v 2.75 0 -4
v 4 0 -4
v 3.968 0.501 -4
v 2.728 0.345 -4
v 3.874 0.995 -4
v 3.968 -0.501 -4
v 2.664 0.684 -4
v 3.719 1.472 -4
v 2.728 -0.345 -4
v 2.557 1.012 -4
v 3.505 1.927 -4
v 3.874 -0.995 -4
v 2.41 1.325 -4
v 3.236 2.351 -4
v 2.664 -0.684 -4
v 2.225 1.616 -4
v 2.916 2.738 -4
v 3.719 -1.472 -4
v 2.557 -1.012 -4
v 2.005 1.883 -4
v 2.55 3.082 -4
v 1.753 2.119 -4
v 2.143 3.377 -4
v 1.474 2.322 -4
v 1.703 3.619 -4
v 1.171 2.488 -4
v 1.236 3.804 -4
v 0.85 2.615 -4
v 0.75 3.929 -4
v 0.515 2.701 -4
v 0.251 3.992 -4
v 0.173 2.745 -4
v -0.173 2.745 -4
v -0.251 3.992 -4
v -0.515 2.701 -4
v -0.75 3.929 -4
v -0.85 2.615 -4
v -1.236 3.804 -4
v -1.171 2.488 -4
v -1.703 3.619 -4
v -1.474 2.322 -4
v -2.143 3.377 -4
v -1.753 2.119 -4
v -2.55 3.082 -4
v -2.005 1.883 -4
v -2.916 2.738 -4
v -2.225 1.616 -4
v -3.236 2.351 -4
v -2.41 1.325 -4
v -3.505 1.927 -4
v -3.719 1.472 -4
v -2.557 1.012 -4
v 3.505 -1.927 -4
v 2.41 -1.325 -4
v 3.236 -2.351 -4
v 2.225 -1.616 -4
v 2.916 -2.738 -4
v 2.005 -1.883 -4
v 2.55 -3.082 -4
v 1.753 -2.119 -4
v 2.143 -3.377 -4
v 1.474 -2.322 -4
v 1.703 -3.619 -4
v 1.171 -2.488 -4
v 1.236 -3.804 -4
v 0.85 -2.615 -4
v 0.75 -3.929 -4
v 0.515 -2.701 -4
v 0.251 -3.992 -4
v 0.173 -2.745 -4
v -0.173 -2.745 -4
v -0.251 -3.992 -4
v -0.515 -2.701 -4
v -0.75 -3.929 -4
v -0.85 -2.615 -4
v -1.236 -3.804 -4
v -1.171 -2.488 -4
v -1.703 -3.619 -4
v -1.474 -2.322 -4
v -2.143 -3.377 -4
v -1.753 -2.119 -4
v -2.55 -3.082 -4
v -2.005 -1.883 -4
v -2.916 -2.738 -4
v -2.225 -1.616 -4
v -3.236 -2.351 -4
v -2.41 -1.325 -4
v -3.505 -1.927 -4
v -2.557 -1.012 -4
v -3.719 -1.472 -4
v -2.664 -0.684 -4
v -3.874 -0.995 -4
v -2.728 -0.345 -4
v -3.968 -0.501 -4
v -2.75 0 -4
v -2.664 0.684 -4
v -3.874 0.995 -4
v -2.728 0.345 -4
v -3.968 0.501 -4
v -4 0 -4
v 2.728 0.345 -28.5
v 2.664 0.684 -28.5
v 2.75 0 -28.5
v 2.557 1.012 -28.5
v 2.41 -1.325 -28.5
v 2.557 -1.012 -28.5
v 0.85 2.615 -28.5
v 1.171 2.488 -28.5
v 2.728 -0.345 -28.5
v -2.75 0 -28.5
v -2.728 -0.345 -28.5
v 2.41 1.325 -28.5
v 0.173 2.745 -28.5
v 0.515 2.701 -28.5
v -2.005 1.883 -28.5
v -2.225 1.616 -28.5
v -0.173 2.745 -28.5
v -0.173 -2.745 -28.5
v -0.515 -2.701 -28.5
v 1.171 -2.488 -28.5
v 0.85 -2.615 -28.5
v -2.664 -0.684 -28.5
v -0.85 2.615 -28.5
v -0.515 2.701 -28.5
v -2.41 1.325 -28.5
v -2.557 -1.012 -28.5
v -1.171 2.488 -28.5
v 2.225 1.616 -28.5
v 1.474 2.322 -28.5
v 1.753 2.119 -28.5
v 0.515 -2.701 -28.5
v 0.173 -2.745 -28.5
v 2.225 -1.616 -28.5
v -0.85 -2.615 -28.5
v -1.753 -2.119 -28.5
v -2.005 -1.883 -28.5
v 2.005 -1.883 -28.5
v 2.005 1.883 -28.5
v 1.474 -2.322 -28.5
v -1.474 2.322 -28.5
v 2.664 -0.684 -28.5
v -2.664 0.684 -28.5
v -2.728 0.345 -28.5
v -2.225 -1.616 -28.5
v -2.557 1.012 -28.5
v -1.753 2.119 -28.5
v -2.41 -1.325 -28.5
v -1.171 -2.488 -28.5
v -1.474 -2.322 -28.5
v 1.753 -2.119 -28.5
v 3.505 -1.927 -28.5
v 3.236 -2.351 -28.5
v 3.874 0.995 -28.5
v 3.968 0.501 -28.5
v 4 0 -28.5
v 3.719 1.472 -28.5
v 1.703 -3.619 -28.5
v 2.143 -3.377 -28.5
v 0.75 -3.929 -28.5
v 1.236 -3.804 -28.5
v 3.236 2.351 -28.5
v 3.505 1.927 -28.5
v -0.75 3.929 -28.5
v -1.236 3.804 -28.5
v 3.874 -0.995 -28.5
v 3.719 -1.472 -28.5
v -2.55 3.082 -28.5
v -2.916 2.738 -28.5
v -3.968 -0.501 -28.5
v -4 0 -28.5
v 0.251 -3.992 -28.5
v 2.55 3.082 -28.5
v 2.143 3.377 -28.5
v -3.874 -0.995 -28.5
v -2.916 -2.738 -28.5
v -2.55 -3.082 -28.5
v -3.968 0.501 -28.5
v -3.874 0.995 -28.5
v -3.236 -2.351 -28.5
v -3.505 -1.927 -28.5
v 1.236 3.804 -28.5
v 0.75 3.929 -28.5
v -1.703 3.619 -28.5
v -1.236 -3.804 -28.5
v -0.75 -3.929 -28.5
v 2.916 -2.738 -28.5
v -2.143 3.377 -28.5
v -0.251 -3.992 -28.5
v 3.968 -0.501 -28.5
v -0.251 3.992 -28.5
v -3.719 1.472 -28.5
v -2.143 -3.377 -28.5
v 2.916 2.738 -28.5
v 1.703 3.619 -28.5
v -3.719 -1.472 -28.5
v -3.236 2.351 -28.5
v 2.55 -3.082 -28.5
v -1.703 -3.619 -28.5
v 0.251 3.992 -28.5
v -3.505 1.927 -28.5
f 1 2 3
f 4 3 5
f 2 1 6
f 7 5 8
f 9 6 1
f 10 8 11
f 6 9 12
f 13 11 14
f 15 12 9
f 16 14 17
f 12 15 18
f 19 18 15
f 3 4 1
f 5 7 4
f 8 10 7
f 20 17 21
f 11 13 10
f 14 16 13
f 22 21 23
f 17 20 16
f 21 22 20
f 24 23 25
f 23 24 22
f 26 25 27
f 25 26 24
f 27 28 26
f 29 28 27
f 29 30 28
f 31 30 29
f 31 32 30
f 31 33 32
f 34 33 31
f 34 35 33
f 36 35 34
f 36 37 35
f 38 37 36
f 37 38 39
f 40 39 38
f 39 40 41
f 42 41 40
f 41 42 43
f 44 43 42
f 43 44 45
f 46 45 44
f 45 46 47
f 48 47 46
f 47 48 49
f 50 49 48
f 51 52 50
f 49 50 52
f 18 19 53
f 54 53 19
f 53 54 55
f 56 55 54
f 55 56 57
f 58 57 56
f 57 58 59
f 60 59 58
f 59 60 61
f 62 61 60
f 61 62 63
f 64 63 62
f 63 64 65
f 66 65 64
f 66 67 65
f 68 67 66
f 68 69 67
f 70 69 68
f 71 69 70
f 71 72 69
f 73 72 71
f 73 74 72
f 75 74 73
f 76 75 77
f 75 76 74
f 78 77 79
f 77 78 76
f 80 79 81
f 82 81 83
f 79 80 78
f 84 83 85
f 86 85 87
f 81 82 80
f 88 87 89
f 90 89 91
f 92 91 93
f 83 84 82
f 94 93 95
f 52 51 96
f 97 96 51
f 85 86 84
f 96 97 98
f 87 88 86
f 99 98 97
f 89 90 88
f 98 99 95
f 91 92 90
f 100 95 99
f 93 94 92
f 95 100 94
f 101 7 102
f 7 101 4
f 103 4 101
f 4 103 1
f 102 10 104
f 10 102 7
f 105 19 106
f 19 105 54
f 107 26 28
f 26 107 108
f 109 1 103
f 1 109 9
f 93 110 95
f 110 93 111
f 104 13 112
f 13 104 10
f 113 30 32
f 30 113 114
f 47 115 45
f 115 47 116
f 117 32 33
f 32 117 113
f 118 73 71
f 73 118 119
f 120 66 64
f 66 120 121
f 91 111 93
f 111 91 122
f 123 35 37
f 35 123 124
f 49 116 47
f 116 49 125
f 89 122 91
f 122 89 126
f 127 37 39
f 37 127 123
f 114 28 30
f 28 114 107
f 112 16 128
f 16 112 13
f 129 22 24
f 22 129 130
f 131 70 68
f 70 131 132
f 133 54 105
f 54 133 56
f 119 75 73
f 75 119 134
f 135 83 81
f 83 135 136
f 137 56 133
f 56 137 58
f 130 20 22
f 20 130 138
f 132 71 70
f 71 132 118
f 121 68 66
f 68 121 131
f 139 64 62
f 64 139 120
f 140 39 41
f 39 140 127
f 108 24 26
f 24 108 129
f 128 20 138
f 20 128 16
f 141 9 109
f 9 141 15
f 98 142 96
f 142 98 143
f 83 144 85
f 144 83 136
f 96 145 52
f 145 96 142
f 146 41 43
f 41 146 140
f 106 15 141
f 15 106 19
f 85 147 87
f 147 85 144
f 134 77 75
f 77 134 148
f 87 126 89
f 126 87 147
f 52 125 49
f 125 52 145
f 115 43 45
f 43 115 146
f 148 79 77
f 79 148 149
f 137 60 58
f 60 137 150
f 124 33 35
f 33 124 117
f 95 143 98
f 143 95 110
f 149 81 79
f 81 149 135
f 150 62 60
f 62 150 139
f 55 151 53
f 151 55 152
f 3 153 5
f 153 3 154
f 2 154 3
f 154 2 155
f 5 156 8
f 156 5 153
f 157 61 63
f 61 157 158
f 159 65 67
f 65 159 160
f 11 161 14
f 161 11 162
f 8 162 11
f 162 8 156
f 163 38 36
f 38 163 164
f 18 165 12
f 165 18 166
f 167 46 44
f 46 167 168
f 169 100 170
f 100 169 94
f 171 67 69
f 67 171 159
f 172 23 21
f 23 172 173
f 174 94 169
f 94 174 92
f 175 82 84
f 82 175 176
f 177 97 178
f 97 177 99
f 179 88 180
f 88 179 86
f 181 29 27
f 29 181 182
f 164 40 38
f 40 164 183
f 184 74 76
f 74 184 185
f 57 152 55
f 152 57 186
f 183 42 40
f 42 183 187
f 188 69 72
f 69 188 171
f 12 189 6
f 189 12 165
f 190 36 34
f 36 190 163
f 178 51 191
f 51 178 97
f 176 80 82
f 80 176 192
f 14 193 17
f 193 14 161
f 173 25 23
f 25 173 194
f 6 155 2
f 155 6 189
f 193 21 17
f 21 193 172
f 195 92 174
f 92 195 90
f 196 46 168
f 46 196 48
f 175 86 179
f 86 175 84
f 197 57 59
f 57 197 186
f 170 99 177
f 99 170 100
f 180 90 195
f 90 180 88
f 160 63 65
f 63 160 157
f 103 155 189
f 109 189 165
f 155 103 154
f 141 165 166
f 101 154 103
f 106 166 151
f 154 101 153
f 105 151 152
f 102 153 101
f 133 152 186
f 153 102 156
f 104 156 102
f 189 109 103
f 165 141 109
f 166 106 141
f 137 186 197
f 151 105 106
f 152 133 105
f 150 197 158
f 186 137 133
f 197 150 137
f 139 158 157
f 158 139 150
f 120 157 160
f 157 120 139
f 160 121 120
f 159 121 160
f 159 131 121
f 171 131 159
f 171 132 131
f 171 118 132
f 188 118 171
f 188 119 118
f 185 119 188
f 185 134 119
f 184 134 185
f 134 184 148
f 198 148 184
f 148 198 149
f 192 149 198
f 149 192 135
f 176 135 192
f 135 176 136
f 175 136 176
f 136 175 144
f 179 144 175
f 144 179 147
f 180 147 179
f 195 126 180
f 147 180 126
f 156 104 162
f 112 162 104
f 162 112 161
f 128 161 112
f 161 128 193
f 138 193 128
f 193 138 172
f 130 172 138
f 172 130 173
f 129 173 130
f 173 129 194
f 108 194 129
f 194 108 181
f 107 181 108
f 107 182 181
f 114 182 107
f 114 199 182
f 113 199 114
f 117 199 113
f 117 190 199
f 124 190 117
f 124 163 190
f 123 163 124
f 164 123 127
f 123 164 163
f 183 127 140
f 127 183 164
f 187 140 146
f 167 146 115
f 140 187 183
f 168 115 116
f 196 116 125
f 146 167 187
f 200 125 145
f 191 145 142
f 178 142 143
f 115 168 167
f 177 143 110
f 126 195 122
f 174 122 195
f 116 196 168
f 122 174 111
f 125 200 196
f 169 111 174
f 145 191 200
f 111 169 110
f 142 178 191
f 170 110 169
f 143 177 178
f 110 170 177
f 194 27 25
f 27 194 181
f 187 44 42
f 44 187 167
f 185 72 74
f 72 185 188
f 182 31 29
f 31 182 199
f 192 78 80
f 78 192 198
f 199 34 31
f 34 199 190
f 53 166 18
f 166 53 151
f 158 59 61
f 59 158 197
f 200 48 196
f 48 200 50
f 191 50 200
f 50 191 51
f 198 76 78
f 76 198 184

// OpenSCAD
$fn = 50;

difference() {
	union() {
		translate(v = [0, 0, -28.5]) {
			cylinder(h = 28.5, r = 4.0);
		}
	}
	union() {
		translate(v = [0, 0, 0]) {
			rotate(a = [0, 0, 0]) {
				difference() {
					union() {
						translate(v = [0, 0, -4]) {
							linear_extrude(height = 4) {
								polygon(points = [[4.8468, 0.0], [2.4234000000000004, 4.197451927062417], [-2.423399999999999, 4.197451927062417], [-4.8468, 5.935618106107392e-16], [-2.423400000000002, -4.197451927062416], [2.423399999999997, -4.197451927062419]]);
							}
						}
					}
					union();
				}
			}
		}
		#translate(v = [0, 0, -100.0]) {
			cylinder(h = 200, r = 2.75);
		}
	}
}
